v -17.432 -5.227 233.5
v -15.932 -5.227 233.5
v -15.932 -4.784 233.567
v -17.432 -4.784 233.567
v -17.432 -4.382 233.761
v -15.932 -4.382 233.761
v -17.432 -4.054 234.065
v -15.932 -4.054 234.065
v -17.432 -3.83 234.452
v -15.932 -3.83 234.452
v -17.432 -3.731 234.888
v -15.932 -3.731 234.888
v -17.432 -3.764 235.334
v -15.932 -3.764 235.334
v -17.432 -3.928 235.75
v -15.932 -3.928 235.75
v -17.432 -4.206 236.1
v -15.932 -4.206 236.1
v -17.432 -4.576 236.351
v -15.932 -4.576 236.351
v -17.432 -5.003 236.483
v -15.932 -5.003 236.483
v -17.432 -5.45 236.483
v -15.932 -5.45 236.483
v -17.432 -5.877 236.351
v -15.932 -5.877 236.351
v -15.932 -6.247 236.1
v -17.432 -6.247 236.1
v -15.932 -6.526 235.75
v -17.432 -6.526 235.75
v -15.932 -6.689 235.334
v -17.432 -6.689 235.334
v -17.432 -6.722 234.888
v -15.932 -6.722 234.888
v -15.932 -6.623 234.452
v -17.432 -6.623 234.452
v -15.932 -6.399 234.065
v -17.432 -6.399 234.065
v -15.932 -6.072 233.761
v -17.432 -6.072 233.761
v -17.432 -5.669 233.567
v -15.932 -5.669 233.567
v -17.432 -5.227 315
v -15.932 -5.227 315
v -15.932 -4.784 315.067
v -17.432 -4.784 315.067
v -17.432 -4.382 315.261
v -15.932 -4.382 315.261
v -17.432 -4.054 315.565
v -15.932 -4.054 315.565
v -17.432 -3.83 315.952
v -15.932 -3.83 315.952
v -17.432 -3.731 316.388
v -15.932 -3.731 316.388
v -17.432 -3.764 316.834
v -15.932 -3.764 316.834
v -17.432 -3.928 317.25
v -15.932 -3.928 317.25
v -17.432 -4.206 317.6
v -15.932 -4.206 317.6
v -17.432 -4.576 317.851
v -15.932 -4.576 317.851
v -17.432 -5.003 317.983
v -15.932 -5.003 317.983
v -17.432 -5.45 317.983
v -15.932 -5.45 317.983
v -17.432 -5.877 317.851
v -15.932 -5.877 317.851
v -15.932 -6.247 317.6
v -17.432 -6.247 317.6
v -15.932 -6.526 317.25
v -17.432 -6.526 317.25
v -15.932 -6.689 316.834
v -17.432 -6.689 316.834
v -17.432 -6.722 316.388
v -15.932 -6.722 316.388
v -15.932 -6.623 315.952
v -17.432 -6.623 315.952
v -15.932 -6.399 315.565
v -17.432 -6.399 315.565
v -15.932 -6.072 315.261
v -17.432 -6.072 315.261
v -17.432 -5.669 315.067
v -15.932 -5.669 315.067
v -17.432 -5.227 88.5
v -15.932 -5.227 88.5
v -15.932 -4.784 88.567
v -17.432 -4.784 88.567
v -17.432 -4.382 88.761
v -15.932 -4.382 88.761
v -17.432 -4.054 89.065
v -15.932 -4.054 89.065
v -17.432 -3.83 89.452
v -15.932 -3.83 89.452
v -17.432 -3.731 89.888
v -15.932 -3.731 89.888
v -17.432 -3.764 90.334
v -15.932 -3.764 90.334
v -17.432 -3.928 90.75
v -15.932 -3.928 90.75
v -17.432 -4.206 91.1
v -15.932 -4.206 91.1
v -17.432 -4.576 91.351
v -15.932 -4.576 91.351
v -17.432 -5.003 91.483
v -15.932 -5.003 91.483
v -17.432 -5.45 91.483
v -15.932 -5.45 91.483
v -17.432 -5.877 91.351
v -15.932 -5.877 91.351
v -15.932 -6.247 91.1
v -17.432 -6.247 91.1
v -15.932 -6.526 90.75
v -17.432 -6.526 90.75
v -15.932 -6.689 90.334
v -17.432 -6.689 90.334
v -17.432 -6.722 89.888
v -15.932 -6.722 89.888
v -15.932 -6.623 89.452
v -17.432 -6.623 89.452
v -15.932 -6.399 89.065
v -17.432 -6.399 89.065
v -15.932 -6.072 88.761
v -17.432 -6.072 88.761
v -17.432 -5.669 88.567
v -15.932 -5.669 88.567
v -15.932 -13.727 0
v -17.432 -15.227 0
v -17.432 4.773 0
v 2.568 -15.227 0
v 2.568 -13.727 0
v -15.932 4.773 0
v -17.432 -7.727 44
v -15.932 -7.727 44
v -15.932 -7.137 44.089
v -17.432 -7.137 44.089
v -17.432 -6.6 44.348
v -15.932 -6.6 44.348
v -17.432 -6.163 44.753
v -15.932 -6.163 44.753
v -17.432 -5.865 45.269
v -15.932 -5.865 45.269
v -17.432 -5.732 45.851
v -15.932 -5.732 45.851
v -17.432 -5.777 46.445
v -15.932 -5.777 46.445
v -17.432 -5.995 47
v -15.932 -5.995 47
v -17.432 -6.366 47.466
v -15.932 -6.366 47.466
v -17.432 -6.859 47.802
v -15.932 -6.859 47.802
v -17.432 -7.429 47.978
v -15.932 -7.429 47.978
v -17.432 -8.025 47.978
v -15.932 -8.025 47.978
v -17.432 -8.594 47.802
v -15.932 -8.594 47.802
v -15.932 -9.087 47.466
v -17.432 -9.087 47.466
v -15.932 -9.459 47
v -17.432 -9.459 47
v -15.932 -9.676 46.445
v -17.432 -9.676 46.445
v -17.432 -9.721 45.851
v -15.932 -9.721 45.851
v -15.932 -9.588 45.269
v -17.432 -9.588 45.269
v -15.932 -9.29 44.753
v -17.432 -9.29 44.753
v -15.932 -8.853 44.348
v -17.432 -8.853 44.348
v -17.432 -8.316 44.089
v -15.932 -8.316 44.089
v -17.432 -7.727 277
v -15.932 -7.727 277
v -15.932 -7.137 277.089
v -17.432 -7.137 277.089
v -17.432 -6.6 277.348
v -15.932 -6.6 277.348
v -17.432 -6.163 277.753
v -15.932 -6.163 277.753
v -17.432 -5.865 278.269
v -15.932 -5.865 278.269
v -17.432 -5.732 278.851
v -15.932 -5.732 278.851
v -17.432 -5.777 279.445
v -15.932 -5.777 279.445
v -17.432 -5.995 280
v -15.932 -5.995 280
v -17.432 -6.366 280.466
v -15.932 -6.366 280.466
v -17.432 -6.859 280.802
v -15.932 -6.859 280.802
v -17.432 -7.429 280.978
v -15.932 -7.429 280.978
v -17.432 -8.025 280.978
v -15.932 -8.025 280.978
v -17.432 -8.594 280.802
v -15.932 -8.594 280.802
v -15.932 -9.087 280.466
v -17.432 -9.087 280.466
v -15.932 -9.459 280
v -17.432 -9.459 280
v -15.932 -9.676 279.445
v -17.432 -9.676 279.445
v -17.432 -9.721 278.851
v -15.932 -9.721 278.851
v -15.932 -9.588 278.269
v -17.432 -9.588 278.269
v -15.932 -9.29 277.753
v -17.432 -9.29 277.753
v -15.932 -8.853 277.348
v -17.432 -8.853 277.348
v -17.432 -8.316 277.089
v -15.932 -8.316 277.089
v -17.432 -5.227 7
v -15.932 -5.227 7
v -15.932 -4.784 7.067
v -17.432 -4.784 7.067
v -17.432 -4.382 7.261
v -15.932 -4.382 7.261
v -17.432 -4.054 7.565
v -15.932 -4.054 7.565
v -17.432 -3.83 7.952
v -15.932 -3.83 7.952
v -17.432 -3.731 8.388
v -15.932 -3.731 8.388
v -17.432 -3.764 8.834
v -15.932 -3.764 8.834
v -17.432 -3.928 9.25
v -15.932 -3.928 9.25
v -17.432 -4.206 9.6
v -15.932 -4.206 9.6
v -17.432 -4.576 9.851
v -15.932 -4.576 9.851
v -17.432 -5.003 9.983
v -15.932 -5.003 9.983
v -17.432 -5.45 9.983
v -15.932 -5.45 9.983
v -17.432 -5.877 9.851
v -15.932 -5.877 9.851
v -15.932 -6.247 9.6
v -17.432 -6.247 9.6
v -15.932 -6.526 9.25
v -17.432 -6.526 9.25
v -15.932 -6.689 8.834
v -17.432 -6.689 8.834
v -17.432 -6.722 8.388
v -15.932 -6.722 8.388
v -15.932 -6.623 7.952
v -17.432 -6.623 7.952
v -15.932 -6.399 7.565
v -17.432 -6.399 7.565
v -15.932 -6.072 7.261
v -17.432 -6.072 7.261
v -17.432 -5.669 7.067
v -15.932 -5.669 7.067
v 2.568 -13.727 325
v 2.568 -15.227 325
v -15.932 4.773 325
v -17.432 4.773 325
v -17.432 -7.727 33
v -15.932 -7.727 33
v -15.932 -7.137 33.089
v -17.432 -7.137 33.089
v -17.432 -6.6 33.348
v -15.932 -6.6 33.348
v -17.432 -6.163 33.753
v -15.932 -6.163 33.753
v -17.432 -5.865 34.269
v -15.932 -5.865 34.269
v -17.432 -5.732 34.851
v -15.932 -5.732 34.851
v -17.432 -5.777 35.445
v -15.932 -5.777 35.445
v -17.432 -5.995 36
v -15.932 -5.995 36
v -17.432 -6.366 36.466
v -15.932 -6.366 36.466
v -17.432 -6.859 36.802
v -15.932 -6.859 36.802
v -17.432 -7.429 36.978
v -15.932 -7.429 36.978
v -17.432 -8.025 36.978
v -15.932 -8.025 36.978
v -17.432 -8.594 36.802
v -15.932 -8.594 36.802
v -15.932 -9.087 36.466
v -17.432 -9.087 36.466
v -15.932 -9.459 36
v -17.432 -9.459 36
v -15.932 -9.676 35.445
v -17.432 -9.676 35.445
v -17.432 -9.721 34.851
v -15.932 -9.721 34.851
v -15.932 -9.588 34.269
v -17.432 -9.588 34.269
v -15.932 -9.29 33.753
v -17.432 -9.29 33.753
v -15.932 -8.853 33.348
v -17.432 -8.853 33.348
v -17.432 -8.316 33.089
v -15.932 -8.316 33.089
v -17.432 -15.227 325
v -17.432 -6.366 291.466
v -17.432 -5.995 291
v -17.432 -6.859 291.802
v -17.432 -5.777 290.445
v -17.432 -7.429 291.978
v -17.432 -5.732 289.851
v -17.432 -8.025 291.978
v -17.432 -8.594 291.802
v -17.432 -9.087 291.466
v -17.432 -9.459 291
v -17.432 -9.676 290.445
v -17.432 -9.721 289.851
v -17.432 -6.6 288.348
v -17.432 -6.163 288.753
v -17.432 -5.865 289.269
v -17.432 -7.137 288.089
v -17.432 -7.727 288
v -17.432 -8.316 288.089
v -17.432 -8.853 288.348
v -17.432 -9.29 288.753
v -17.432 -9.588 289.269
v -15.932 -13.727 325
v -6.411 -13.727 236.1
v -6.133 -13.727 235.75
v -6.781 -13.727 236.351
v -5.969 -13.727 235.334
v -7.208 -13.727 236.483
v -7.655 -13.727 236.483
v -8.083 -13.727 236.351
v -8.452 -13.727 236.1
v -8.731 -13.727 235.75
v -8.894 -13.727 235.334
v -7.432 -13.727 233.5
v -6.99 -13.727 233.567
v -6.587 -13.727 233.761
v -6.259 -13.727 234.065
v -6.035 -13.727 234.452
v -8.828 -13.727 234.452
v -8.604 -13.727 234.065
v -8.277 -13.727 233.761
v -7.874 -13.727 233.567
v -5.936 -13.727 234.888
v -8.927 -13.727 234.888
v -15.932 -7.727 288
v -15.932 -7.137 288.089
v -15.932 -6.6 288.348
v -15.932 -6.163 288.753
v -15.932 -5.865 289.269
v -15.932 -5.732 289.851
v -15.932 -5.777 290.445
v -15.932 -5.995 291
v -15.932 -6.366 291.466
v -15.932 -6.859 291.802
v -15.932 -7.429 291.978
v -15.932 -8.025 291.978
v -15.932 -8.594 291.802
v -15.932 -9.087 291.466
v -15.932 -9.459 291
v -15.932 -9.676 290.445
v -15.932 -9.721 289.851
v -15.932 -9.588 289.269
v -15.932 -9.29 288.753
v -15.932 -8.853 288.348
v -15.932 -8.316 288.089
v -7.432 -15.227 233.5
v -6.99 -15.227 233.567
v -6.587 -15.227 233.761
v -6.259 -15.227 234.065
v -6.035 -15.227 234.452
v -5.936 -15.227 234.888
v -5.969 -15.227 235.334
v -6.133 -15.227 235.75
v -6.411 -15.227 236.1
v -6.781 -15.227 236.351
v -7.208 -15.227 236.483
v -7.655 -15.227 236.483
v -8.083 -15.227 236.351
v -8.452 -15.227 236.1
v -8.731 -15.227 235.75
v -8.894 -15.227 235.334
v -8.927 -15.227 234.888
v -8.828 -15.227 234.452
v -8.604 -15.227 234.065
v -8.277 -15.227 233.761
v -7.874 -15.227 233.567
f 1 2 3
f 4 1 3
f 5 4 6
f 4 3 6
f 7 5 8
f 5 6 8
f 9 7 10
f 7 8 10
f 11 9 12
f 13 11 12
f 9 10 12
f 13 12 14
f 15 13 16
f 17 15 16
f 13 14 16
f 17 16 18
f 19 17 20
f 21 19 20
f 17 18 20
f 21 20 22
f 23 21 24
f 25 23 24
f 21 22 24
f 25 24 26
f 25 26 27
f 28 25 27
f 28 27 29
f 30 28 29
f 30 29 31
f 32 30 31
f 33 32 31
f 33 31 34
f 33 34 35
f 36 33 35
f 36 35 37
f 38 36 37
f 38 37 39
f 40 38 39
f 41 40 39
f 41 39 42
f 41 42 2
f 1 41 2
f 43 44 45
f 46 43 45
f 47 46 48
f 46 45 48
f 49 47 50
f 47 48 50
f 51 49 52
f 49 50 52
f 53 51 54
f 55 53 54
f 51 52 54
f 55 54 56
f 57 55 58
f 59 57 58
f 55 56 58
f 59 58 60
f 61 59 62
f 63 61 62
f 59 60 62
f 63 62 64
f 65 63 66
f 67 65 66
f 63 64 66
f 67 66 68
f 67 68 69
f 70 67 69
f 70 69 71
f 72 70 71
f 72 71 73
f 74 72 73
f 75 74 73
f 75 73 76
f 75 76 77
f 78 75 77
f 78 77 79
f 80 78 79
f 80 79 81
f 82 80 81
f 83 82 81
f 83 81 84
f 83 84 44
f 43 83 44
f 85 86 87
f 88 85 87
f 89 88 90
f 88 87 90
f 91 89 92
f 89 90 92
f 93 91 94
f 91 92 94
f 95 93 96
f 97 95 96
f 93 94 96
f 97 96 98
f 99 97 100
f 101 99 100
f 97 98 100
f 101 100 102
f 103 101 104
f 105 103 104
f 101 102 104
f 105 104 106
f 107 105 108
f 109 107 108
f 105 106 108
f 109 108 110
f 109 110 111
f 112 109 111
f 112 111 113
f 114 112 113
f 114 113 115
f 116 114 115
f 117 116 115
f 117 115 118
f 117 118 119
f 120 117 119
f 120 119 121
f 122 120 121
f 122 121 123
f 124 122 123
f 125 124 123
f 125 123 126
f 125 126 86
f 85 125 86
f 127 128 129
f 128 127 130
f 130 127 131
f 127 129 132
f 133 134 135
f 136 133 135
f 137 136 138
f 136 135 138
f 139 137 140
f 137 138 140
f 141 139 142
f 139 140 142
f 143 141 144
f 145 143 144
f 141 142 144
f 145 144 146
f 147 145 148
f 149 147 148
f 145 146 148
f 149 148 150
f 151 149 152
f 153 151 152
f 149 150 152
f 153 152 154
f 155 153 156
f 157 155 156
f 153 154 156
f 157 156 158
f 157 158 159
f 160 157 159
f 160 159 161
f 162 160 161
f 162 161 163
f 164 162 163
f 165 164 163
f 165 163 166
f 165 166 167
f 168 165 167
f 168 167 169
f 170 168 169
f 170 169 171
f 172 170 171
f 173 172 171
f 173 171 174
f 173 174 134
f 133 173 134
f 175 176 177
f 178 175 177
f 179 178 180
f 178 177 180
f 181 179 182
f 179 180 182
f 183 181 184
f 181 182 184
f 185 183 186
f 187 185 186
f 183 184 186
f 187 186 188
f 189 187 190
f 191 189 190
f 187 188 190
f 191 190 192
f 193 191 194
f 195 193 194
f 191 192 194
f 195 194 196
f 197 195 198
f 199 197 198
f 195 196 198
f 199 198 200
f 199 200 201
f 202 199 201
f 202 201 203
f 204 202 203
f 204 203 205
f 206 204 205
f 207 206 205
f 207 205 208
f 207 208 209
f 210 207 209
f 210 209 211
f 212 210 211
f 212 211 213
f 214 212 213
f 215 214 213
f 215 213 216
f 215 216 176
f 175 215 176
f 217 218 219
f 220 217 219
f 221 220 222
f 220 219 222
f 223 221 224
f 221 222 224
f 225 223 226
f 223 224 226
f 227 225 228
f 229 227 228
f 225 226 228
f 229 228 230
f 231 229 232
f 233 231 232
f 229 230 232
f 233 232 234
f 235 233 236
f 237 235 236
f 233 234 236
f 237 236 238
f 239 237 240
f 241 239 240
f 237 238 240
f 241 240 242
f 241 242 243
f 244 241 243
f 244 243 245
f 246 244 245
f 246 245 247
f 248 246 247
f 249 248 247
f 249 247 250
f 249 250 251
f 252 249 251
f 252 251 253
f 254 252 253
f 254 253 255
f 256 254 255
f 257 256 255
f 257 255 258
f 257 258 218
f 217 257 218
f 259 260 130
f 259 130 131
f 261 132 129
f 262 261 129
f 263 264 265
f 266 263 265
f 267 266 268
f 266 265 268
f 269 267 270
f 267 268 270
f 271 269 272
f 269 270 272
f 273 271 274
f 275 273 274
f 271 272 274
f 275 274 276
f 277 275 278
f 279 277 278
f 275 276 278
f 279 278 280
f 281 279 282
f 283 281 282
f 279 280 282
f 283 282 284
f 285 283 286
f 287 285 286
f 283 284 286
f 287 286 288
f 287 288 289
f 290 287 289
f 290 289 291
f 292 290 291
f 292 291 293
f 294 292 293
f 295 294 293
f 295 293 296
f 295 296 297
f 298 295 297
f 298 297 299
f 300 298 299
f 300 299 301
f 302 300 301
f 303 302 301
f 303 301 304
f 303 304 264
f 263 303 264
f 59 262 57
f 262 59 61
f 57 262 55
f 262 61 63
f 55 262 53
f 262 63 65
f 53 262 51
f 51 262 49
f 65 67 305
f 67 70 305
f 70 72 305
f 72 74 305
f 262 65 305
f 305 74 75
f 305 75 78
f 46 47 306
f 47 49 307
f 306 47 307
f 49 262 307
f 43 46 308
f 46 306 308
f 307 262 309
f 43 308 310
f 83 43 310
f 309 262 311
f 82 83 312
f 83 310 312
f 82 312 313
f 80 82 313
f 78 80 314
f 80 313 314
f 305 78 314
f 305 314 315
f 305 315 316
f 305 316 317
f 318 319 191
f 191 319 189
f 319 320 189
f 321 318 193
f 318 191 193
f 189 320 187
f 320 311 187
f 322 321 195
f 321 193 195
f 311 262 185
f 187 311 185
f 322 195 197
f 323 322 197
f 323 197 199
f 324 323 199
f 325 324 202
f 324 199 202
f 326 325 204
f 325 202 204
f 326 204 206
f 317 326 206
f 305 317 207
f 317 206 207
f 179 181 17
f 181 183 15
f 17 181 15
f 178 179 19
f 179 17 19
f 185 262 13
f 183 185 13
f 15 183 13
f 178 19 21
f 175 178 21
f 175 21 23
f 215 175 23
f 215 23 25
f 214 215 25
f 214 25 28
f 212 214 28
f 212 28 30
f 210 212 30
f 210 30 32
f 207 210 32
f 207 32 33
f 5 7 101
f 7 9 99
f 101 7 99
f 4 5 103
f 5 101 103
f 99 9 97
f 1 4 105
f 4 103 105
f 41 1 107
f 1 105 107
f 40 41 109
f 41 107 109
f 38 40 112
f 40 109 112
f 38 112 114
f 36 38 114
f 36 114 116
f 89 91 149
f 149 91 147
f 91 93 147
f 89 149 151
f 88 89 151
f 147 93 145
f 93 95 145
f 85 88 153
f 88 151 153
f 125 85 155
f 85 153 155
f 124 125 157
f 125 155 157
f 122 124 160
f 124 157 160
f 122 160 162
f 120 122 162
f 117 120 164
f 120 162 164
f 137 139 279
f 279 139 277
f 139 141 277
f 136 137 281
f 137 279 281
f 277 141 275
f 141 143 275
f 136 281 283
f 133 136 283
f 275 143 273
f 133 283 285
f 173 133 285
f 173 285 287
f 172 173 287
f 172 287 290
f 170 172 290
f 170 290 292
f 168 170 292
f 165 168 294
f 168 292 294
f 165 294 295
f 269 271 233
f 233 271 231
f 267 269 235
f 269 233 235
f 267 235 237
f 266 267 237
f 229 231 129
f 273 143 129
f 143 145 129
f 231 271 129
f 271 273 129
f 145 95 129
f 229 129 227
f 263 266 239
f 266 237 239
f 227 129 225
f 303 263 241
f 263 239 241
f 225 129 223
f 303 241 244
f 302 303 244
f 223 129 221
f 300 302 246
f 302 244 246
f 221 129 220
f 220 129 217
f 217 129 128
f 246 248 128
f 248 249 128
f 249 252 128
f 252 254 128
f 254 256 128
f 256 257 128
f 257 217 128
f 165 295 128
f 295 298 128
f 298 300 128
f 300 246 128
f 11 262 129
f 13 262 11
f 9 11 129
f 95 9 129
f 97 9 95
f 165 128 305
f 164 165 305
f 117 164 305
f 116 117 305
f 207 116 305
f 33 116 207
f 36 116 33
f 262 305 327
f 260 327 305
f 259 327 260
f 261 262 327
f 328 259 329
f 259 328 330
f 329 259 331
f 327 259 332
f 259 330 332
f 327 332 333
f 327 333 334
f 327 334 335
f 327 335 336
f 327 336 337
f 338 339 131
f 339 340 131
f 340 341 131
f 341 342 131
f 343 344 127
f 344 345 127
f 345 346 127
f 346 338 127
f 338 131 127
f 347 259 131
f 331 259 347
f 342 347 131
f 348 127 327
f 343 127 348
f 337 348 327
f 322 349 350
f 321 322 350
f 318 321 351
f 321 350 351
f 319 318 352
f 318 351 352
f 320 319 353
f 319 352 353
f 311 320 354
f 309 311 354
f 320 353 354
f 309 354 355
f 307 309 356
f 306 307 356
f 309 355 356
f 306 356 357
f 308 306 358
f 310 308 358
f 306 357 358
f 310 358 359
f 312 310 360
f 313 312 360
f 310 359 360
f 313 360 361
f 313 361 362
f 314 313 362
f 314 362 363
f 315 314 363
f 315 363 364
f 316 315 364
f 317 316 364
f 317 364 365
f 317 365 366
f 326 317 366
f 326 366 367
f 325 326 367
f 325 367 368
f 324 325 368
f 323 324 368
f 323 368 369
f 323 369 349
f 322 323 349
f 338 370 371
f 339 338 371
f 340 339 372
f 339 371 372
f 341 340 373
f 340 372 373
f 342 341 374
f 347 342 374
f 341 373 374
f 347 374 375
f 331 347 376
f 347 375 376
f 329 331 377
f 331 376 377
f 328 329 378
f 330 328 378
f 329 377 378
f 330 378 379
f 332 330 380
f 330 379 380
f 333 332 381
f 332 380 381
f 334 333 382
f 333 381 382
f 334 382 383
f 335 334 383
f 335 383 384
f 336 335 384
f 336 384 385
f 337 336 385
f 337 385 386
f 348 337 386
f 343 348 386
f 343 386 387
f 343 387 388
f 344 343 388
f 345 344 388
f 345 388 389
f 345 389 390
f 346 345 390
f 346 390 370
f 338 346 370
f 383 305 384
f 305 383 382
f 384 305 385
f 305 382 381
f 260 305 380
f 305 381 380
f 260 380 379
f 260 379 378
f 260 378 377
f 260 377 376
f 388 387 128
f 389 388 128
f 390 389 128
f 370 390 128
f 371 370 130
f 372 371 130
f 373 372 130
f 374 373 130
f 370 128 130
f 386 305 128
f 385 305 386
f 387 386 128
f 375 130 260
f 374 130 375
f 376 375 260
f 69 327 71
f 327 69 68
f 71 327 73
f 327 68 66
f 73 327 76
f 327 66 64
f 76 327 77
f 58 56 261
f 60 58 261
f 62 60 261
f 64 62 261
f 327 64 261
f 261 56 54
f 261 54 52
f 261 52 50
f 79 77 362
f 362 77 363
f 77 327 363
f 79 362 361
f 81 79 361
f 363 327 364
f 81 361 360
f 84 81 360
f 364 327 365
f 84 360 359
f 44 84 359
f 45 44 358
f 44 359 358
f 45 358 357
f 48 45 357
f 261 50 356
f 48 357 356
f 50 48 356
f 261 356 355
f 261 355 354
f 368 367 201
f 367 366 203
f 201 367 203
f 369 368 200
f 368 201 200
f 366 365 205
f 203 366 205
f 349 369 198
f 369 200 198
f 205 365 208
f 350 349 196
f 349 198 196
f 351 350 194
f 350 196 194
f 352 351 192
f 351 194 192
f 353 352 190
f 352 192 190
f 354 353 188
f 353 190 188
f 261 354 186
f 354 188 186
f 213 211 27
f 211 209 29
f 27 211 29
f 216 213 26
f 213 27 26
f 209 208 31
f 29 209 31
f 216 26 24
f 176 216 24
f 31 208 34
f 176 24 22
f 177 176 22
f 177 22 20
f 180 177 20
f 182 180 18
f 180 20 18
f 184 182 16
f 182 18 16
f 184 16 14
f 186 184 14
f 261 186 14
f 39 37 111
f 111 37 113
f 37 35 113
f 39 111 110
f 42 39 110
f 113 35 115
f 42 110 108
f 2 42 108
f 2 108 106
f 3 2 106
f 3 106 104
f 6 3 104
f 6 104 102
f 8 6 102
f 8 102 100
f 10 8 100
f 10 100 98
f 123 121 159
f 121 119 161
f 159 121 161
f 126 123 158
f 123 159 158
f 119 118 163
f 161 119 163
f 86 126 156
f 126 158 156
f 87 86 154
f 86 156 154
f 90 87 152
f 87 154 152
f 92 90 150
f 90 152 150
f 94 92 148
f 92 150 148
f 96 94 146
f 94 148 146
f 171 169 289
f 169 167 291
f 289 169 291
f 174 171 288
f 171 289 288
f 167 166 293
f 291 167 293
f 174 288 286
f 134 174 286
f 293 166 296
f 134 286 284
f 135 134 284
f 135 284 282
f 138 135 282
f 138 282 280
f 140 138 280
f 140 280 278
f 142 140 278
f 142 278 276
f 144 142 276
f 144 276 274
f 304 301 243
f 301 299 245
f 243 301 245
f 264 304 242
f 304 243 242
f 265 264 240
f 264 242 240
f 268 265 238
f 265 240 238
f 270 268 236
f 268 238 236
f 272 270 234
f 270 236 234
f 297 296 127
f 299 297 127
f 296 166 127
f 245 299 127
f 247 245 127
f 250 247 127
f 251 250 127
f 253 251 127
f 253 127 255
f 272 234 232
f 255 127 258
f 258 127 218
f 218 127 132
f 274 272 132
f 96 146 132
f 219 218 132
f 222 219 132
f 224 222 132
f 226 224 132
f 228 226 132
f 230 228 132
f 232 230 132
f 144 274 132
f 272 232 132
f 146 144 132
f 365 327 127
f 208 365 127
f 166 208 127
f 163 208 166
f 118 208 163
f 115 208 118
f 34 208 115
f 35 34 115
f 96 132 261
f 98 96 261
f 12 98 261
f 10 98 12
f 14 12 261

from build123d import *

# Parameters (mm, degrees)
EXTRUSION1_DEPTH = 325
ESQUISSE3_R      = 1.5
ESQUISSE3_R_2    = 2
EXTRUSION3_DEPTH = 300
ESQUISSE4_R      = 1.5
EXTRUSION5_DEPTH = 10


with BuildPart() as part:
    # Esquisse1 → Extrusion1 (new body)
    with BuildSketch(Plane.XY):
        Polygon((-17.43168638, 4.773368421), (-17.43168638, -15.226631579), (2.56831362, -15.226631579), (2.56831362, -13.726631579), (-15.93168638, -13.726631579), (-15.93168638, 4.773368421), align=None)
    extrude(amount=EXTRUSION1_DEPTH)

    # Esquisse3 → Extrusion3 (cut)
    with BuildSketch(Plane(origin=(-15.93168638, 0, 0), x_dir=(0, 0, -1), z_dir=(1, 0, 0))):
        with Locations((-316.5, -5.226631579)):
            Circle(ESQUISSE3_R)
        with Locations((-8.5, -5.226631579)):
            Circle(ESQUISSE3_R)
        with Locations((-35, -7.726631579)):
            Circle(ESQUISSE3_R_2)
        with Locations((-46, -7.726631579)):
            Circle(ESQUISSE3_R_2)
        with Locations((-290, -7.726631579)):
            Circle(ESQUISSE3_R_2)
        with Locations((-279, -7.726631579)):
            Circle(ESQUISSE3_R_2)
        with Locations((-235, -5.226631579)):
            Circle(ESQUISSE3_R)
        with Locations((-90, -5.226631579)):
            Circle(ESQUISSE3_R)
    extrude(amount=-EXTRUSION3_DEPTH, mode=Mode.SUBTRACT)

    # Esquisse4 → Extrusion5 (cut)
    with BuildSketch(Plane.XZ.offset(15.226631579)):
        with Locations(Location((-7.43168638, 235, 0), (0, 0, 270))):
            Circle(ESQUISSE4_R)
    extrude(amount=-EXTRUSION5_DEPTH, mode=Mode.SUBTRACT)


solid = part.part
